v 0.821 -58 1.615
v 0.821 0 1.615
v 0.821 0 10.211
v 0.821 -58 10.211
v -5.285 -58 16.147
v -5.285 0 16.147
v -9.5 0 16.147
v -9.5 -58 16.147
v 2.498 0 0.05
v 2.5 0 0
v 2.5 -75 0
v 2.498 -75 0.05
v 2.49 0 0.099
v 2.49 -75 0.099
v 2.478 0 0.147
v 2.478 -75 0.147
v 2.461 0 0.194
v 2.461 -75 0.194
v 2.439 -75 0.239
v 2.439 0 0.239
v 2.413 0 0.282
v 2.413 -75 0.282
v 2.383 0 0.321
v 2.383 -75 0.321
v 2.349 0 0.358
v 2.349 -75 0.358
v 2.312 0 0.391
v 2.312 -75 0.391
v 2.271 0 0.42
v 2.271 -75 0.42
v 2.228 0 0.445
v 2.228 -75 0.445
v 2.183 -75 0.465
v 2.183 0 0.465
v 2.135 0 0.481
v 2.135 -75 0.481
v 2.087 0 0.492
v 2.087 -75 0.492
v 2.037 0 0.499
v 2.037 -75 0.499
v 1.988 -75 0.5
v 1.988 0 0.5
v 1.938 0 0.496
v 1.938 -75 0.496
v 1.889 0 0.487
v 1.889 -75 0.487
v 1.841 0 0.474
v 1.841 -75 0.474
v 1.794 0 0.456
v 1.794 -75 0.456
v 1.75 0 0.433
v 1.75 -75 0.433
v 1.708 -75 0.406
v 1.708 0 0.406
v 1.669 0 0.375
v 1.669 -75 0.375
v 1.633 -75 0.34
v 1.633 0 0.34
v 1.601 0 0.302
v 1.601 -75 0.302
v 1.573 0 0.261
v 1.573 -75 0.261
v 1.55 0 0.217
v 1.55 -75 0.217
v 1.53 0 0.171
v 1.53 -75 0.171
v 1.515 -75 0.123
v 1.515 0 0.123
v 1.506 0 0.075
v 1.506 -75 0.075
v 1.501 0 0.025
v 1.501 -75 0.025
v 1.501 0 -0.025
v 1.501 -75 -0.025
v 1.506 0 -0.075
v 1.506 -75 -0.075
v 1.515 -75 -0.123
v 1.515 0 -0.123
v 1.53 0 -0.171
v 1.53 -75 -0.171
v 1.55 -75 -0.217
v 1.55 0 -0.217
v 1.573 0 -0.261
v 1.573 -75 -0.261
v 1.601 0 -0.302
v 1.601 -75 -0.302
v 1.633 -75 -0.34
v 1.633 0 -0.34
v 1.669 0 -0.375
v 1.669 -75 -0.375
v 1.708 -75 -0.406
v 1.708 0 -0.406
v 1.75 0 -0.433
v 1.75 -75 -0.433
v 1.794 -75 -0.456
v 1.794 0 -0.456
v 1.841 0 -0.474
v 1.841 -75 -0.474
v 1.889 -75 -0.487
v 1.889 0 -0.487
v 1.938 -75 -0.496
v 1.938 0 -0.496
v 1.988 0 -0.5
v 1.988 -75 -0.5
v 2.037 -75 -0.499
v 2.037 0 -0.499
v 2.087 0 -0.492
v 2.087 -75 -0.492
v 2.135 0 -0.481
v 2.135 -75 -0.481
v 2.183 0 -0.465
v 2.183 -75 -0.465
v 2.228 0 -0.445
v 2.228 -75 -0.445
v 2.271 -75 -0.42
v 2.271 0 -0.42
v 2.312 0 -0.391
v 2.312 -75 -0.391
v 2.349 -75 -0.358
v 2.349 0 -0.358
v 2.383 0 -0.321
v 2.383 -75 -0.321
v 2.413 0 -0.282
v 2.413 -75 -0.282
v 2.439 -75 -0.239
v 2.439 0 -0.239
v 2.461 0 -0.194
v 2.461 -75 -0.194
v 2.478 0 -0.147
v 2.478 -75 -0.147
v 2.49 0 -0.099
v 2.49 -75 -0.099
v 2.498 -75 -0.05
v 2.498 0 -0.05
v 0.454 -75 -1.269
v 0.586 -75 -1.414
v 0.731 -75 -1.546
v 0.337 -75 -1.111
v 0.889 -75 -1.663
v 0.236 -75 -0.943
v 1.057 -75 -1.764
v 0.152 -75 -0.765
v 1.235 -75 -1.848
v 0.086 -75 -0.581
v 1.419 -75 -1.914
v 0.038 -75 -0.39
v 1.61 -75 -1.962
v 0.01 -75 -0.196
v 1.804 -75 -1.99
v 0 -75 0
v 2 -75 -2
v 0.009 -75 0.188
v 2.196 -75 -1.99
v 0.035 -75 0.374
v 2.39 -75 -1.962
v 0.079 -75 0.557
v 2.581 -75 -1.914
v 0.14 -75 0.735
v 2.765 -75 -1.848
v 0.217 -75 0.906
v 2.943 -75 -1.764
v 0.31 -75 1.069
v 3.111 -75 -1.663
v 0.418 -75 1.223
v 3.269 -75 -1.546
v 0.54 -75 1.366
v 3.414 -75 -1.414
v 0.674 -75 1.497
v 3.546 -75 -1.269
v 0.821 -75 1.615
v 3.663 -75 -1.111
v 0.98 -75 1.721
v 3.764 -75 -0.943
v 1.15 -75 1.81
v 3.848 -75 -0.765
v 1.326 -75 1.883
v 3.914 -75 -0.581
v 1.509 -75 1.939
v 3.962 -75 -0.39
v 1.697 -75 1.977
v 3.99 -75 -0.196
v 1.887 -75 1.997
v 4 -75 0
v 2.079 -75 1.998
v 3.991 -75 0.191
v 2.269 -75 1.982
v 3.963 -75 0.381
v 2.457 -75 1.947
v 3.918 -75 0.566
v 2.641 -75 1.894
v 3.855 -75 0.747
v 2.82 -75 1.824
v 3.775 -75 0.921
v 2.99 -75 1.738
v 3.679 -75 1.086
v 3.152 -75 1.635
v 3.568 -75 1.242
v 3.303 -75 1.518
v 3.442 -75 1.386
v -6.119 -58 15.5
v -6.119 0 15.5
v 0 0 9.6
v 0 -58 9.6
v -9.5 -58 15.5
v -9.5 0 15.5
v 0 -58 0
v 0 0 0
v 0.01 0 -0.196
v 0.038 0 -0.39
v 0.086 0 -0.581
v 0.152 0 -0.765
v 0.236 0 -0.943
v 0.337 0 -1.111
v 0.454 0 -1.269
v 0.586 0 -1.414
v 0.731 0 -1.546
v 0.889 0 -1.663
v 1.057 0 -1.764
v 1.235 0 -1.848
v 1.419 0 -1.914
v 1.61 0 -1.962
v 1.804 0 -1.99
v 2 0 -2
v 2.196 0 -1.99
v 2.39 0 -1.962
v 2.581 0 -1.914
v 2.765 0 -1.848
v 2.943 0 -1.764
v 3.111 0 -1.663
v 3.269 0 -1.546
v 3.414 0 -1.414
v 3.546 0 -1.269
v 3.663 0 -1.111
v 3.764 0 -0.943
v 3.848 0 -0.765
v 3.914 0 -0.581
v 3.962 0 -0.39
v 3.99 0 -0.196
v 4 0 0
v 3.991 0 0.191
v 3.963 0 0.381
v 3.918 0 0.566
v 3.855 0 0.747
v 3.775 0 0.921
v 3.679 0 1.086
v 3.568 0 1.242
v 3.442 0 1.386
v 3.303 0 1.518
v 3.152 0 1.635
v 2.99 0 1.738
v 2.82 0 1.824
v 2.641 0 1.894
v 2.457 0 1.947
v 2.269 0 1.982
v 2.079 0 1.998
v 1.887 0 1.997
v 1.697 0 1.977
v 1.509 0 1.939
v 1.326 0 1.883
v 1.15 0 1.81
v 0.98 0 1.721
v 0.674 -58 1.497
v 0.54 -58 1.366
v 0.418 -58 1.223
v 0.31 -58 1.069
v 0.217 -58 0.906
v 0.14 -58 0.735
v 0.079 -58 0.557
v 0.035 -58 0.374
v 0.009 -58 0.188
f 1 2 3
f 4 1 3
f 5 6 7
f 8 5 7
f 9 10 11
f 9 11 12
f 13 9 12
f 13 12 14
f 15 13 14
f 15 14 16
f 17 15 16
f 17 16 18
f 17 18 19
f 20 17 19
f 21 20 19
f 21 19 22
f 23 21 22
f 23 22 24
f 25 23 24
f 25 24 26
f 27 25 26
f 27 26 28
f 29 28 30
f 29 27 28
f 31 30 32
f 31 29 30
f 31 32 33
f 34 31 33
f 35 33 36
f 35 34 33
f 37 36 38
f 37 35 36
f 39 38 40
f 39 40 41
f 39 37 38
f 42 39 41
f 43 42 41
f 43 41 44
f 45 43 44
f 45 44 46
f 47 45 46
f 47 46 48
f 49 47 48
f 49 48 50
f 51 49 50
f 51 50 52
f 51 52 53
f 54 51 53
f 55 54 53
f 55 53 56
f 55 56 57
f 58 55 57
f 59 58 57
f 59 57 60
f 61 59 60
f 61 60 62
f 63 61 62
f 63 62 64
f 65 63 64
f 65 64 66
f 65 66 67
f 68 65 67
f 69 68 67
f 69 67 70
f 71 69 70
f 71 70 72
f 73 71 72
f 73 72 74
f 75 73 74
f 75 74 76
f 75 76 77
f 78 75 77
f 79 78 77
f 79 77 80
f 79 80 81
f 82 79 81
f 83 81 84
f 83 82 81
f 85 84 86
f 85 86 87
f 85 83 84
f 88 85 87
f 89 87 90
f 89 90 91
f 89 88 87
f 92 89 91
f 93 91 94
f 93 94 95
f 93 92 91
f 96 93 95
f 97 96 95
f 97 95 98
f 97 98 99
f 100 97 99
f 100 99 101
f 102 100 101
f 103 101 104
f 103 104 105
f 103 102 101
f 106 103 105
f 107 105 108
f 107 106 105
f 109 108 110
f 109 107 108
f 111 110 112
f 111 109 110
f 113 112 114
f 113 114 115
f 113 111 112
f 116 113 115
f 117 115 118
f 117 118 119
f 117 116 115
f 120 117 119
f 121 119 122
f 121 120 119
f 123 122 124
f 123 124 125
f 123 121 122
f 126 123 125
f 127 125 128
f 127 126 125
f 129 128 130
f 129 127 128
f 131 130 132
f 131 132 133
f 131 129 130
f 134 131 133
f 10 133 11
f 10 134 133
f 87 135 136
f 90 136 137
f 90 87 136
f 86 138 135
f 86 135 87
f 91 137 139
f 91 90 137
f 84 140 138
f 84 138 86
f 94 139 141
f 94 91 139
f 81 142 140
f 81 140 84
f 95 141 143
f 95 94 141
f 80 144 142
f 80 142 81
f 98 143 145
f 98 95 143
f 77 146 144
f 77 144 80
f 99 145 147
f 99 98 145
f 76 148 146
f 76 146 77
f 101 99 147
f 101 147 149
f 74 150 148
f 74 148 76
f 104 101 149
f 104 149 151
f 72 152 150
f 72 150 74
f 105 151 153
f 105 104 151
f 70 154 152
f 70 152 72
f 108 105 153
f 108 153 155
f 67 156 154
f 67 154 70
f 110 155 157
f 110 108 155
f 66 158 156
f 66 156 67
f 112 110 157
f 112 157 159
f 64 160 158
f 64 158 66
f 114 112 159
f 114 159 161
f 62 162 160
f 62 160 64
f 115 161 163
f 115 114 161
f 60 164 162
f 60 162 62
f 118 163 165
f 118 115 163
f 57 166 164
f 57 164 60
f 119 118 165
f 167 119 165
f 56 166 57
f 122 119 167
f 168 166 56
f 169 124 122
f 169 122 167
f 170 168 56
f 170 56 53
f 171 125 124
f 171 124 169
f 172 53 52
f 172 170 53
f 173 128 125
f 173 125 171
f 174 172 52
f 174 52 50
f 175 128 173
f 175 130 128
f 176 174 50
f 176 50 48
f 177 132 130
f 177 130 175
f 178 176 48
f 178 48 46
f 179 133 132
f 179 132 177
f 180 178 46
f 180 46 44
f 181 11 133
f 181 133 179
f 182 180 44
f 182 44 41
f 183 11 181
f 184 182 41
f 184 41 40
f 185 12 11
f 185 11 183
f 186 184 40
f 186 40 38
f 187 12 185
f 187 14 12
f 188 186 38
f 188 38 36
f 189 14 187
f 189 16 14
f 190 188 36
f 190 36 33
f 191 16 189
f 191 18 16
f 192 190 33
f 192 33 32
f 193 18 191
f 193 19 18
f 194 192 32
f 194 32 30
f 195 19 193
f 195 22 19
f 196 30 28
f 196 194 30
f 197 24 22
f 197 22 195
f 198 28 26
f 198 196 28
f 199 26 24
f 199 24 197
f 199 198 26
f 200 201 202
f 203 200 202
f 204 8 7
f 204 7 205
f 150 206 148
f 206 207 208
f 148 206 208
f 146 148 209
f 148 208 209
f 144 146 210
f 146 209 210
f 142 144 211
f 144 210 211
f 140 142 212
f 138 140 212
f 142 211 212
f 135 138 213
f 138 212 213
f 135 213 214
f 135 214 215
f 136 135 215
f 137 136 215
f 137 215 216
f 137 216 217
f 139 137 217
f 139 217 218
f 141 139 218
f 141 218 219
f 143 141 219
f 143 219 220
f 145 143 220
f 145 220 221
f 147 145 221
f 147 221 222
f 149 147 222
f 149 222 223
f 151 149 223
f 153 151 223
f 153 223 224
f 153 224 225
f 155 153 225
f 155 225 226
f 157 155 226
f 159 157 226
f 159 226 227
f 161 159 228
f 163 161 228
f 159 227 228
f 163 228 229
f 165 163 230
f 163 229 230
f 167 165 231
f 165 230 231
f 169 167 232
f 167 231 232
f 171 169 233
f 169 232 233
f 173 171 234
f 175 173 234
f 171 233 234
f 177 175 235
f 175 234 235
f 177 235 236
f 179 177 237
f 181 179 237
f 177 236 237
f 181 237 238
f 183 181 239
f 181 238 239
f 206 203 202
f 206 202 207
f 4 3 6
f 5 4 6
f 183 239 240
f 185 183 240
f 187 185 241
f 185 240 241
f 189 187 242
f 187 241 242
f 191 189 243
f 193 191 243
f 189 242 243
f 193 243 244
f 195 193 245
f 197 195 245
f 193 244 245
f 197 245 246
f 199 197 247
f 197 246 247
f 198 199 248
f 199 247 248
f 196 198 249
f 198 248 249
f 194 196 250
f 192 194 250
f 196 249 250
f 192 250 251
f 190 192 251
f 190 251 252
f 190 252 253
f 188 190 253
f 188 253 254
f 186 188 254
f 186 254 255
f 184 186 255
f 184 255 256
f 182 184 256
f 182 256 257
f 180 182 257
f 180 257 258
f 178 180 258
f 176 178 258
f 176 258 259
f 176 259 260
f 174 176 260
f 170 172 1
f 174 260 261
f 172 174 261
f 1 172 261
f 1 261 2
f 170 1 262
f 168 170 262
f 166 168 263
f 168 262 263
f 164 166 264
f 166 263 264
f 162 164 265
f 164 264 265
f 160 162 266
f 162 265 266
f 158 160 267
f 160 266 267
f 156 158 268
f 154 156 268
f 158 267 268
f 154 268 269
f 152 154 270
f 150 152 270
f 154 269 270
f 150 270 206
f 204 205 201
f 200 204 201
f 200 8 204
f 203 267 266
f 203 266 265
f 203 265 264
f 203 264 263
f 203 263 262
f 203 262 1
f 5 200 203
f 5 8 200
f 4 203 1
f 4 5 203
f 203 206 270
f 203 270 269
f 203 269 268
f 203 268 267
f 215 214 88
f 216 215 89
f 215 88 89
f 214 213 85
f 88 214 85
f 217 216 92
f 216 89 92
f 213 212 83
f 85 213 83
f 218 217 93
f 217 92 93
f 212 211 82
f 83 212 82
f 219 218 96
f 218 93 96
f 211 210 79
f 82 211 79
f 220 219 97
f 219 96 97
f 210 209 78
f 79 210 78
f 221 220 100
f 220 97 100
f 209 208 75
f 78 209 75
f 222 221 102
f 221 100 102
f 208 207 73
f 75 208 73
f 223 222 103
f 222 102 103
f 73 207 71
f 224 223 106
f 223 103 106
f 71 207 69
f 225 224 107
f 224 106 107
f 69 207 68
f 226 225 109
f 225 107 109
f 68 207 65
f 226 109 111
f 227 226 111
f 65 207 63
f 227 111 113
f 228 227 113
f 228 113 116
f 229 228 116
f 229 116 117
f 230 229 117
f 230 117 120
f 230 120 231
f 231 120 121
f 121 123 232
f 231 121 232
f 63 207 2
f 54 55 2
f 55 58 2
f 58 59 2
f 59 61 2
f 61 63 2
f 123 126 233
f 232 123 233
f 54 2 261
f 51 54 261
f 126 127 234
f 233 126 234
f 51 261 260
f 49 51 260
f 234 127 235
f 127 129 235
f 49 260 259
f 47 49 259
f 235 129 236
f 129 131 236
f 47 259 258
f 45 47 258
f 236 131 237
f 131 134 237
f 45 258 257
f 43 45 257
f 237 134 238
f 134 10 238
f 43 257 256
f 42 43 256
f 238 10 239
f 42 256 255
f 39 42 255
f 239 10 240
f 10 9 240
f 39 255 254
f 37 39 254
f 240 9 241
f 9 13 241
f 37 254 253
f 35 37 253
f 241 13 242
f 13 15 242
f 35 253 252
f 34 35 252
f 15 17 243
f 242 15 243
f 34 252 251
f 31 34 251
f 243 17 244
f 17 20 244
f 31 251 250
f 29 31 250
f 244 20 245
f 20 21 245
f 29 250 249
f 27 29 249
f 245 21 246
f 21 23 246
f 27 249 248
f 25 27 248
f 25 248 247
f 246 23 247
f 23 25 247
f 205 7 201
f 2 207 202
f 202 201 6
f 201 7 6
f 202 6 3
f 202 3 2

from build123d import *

# Parameters (mm, degrees)
F0_R     = 0.5
F1_DEPTH = 75
F2_DEPTH = 58


with BuildPart() as f1:
    # F0 (on Front) → F1 (new body)
    with BuildSketch(Plane.XZ):
        with BuildLine():
            ThreePointArc((0.820651, 1.615282), (0.216927, 0.905898), (0, 0))
            ThreePointArc((0, 0), (2, -2), (4, 0))
            ThreePointArc((4, 0), (2.905898, 1.783073), (0.820651, 1.615282))
        make_face()
        with Locations((2, 0)):
            Circle(F0_R, mode=Mode.SUBTRACT)
    extrude(amount=F1_DEPTH)

    # F0 (on Front) → F2 (join)
    with BuildSketch(Plane.XZ):
        with BuildLine():
            Line((0, 9.6), (0, 0))
            ThreePointArc((0, 0), (0.216927, 0.905898), (0.820651, 1.615282))
            Line((0.820651, 1.615282), (0.820651, 10.211033))
            Line((0.820651, 10.211033), (-5.284584, 16.147118))
            Line((-5.284584, 16.147118), (-9.5, 16.147118))
            Line((-9.5, 16.147118), (-9.5, 15.5))
            Line((-9.5, 15.5), (-6.118823, 15.5))
            Line((-6.118823, 15.5), (0, 9.6))
        make_face()
        with BuildLine():
            ThreePointArc((0.820651, 1.615282), (0.216927, 0.905898), (0, 0))
            ThreePointArc((0, 0), (2, -2), (4, 0))
            ThreePointArc((4, 0), (2.905898, 1.783073), (0.820651, 1.615282))
        make_face()
        with Locations((2, 0)):
            Circle(F0_R, mode=Mode.SUBTRACT)
    extrude(amount=F2_DEPTH)


solid = f1.part
